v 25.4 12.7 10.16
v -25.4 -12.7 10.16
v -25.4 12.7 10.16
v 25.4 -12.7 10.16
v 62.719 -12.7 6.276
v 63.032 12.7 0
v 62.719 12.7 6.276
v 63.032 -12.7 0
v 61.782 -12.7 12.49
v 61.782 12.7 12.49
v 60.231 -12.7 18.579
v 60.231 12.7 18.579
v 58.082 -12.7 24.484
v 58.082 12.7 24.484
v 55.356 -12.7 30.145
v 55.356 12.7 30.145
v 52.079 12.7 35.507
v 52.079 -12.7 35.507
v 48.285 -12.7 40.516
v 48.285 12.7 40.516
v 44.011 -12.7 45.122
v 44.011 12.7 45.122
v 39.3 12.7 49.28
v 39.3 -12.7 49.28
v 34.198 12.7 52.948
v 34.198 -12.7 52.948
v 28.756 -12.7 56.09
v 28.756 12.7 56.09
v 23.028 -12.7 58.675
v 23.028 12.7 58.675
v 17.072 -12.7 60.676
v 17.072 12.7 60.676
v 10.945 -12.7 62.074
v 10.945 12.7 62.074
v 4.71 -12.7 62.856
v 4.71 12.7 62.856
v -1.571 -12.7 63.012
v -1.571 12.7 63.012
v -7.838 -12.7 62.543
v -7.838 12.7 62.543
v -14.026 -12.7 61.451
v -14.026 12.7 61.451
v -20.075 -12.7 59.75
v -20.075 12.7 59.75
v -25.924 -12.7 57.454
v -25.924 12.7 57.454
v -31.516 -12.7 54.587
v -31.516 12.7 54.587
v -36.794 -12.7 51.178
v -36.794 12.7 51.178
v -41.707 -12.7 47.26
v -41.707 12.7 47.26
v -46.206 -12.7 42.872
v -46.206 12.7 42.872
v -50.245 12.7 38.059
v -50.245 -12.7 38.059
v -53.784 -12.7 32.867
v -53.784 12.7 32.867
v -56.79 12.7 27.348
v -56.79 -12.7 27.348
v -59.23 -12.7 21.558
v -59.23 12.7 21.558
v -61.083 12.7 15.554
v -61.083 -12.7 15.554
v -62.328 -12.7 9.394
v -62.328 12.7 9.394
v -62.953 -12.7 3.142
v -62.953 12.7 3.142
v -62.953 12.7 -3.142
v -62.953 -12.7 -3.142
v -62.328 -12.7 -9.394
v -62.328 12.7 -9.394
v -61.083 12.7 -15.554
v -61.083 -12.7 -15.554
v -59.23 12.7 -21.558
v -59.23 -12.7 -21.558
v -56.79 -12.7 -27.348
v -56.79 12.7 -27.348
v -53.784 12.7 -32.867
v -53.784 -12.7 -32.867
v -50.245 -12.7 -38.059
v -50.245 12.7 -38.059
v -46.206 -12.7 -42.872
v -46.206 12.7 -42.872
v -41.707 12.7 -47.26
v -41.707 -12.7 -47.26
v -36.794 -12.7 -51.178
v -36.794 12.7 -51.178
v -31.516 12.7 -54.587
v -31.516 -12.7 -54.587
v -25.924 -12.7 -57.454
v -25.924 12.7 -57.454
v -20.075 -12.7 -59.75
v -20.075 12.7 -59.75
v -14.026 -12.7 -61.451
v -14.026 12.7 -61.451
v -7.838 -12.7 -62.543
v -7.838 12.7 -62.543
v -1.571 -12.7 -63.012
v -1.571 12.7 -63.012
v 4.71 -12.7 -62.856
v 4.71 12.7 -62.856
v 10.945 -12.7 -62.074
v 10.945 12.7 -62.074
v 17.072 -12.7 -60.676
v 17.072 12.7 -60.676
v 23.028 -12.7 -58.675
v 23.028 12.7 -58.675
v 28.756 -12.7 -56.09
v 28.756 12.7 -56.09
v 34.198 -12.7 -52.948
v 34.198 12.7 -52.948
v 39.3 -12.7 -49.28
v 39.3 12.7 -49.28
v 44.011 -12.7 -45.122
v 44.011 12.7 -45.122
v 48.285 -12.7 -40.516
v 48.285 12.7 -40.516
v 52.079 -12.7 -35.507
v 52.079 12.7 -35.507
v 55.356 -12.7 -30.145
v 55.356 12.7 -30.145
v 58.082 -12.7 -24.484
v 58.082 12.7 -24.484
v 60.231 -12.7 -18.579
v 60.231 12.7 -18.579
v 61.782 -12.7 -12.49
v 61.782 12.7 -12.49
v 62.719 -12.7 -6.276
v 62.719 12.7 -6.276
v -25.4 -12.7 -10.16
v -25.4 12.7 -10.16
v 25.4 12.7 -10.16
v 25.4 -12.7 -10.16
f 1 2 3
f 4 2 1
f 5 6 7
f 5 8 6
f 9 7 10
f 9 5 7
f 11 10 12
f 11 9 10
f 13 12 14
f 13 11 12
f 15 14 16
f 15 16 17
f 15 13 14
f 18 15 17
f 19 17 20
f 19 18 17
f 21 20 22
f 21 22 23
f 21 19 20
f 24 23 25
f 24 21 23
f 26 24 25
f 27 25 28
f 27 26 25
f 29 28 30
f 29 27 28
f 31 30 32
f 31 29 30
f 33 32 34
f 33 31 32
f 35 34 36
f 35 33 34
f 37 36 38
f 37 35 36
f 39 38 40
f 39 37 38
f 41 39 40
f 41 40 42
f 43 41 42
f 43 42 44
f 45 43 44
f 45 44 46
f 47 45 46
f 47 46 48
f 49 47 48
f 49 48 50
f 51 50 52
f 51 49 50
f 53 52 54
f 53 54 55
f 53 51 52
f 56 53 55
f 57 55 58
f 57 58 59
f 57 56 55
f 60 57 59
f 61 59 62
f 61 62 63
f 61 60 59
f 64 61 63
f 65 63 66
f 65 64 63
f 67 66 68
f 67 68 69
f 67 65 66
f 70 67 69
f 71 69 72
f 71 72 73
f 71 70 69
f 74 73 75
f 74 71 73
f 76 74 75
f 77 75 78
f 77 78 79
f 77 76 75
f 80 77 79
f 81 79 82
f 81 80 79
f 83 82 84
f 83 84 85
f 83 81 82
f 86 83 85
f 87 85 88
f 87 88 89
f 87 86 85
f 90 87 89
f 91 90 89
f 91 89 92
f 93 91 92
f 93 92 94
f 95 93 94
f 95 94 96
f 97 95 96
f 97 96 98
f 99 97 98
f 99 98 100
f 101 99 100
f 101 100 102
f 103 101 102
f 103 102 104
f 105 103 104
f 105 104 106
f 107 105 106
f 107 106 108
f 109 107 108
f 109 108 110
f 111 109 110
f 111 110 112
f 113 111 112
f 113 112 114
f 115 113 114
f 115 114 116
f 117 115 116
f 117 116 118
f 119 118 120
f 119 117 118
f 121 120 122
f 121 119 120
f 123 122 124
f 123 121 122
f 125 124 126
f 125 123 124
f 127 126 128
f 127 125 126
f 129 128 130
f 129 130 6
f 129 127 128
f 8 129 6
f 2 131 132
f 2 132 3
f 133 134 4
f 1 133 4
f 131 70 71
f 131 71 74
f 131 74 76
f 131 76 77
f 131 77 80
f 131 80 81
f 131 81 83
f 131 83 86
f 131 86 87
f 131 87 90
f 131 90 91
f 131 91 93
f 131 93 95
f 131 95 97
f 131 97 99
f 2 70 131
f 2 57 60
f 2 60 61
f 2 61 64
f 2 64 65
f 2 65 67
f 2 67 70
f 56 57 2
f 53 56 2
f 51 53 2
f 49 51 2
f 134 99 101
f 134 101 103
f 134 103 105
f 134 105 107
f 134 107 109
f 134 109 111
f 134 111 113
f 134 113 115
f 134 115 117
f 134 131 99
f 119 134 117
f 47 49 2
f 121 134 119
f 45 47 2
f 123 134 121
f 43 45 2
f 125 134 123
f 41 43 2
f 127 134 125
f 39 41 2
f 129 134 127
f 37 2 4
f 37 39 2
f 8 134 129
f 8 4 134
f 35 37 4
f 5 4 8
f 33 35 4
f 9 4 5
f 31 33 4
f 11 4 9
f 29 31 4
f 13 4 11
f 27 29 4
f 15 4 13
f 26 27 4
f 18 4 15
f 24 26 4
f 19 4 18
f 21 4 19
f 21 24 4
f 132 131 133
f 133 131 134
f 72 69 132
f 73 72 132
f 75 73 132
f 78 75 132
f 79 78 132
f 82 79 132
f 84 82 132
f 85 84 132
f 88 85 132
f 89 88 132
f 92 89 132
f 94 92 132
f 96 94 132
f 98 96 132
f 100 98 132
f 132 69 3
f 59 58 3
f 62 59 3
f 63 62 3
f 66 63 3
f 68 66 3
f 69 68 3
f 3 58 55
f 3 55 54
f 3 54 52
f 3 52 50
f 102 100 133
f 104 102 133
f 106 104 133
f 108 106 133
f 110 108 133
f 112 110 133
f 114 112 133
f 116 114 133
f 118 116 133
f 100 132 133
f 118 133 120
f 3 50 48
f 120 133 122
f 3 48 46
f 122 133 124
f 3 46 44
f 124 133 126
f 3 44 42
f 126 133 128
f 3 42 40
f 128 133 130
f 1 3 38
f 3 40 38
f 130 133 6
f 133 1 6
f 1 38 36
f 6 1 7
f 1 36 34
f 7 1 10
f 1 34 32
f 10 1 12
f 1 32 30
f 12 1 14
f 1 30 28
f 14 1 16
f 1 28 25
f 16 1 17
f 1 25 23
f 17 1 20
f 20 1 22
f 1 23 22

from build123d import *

# Parameters (mm, degrees)
F0_R     = 63.031777
F1_DEPTH = 12.7
F2_W     = 50.8
F2_H     = 20.32
F3_DEPTH = 25.401


with BuildPart() as f1:
    # F0 (on Front) → F1 (new body, symmetric)
    with BuildSketch(Plane.XZ):
        Circle(F0_R)
    extrude(amount=F1_DEPTH, both=True)

    # F2 (on face) → F3 (cut, through all)
    with BuildSketch(Plane.XZ.offset(12.7)):
        Rectangle(F2_W, F2_H)
    extrude(amount=-F3_DEPTH, mode=Mode.SUBTRACT)


solid = f1.part
